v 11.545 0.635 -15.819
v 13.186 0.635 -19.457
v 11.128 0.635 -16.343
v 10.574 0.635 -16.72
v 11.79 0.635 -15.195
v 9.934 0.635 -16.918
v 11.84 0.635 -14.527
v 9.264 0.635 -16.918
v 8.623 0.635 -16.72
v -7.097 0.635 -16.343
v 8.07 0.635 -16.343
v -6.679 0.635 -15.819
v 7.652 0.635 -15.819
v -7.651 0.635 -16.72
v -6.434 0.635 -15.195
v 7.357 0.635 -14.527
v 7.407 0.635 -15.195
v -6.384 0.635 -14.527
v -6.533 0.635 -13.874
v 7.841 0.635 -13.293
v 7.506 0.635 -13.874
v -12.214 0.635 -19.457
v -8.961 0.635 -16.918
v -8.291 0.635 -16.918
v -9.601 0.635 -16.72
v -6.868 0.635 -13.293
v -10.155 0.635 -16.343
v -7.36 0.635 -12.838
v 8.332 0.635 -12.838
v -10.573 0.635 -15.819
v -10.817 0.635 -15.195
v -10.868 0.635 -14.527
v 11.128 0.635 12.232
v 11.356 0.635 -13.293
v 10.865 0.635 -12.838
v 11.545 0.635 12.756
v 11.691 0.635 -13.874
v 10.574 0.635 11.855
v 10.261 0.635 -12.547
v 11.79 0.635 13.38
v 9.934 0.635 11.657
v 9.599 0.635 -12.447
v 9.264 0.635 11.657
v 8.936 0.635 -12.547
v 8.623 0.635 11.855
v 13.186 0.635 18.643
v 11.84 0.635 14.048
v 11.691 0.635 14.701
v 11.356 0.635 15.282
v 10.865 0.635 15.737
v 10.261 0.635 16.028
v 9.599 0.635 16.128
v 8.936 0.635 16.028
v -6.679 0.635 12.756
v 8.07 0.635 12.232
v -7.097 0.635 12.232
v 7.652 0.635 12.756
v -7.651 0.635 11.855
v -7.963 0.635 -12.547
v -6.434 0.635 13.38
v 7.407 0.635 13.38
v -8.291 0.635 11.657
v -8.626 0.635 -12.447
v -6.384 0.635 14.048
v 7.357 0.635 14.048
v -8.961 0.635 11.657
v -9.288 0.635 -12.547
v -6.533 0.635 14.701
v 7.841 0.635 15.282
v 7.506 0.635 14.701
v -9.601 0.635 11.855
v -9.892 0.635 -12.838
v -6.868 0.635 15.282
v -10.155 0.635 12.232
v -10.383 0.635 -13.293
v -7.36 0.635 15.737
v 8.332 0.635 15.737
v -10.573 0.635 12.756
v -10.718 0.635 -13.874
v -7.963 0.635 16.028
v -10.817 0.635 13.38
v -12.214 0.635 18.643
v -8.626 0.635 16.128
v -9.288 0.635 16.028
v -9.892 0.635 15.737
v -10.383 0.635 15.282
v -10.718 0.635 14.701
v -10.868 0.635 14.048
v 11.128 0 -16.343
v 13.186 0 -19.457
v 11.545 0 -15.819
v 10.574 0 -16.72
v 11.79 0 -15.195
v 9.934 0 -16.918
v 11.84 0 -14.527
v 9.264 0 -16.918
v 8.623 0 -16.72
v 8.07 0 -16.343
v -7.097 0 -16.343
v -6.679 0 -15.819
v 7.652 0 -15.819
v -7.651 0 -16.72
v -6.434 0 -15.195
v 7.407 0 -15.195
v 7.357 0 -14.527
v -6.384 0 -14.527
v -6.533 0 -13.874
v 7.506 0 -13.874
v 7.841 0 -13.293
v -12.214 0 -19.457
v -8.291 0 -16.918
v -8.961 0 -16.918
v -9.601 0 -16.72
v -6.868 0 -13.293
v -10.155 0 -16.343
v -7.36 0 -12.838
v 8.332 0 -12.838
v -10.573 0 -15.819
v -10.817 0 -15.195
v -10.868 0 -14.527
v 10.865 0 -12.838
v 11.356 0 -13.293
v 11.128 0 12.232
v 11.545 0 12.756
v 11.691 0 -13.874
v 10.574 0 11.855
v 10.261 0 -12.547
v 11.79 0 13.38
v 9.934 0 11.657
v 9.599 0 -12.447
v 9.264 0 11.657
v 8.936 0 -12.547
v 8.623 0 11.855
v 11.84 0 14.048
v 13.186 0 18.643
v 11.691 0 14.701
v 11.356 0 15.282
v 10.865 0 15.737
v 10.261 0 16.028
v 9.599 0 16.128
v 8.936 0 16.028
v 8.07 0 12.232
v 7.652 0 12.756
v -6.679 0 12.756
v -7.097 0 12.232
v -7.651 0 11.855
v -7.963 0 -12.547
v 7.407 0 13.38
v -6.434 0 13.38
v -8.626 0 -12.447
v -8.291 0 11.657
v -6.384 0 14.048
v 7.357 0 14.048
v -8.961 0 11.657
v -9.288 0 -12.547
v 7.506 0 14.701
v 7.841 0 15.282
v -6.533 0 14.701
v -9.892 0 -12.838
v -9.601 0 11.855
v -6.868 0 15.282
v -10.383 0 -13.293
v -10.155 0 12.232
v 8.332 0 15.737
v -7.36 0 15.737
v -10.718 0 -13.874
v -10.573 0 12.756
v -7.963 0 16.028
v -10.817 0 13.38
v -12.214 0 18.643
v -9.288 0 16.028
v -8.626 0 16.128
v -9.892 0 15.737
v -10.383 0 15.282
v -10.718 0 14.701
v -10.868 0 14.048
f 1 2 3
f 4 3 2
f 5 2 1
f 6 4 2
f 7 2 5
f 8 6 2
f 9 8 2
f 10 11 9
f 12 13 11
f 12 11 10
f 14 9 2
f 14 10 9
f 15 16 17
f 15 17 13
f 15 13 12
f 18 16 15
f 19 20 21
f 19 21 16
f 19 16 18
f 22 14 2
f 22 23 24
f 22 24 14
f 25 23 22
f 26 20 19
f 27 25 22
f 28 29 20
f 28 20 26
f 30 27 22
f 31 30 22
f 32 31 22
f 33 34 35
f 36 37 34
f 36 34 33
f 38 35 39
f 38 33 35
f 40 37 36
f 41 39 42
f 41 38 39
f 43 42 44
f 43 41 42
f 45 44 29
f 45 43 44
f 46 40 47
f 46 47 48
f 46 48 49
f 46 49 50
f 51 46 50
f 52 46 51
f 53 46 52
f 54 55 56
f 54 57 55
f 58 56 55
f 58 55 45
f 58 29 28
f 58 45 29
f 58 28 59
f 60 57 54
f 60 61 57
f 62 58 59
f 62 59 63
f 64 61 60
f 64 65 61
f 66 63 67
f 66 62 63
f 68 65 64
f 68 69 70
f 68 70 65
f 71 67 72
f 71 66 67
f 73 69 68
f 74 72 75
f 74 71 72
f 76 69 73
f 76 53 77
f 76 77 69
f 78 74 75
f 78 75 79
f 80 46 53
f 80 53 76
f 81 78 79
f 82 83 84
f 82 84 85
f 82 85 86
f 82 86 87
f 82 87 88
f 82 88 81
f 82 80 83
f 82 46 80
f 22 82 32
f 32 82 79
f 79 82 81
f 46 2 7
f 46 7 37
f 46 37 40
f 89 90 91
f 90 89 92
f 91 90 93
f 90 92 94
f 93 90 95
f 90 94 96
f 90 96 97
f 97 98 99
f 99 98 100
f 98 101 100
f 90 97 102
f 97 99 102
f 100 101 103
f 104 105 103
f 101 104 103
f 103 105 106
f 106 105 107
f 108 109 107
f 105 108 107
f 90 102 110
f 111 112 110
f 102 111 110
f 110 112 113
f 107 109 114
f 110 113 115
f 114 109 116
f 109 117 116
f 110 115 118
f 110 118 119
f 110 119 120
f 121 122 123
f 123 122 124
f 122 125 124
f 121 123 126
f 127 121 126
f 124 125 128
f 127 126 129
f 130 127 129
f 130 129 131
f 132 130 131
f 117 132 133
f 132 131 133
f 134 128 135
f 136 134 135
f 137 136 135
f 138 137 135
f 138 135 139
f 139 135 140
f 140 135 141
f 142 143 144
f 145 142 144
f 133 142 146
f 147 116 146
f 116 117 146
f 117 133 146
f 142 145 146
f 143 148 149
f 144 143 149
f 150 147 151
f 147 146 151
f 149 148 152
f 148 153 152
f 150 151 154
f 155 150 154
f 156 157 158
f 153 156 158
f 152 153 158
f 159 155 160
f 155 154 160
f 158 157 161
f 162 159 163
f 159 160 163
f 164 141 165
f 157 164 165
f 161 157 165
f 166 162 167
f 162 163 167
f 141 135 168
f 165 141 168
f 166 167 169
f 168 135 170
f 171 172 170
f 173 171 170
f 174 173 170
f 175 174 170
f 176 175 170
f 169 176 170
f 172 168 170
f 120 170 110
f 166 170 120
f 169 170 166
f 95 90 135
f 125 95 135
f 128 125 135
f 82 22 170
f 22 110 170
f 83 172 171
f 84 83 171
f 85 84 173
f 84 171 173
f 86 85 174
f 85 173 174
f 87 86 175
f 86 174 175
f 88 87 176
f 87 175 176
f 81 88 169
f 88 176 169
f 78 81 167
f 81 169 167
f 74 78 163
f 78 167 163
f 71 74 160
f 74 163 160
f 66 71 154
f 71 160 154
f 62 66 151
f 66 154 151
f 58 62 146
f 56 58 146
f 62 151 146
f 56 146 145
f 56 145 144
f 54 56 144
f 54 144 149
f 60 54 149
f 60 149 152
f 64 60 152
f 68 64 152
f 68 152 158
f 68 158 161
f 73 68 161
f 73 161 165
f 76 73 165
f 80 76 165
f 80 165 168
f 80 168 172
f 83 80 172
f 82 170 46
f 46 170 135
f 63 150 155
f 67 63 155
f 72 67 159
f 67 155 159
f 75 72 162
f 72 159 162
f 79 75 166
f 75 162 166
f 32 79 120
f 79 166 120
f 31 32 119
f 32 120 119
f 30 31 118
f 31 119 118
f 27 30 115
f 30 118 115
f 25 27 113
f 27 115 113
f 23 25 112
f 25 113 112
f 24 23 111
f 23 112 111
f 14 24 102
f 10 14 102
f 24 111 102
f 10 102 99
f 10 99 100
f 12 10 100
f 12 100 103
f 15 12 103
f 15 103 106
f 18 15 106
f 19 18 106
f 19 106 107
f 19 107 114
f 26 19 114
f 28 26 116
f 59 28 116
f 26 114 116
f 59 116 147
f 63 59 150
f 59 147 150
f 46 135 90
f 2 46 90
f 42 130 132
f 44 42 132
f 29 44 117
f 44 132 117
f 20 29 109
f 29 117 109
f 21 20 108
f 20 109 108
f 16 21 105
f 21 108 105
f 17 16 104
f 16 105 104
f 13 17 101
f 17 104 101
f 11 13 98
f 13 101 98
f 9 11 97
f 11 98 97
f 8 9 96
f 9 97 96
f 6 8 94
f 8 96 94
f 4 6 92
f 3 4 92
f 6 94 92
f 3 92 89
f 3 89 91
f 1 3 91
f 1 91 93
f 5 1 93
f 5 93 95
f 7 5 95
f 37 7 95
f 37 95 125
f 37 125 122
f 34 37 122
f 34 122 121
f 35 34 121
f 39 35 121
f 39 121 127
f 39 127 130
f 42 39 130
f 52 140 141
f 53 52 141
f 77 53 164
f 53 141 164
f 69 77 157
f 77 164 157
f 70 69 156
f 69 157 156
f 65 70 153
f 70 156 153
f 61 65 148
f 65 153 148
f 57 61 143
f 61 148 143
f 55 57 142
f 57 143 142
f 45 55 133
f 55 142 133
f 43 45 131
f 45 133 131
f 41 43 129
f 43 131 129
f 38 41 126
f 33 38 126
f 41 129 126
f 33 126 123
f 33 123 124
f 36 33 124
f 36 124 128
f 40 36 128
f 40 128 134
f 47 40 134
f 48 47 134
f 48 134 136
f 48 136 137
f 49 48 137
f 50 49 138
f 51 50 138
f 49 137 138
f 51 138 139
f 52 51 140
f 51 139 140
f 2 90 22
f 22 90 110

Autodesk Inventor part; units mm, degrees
ref_plane "YZ Plane" through (0, 0, 0) normal (1, 0, 0) x (0, 1, 0)
ref_plane "XZ Plane" through (0, 0, 0) normal (0, 1, 0) x (-1, 0, 0)
ref_plane "XY Plane" through (0, 0, 0) normal (0, 0, 1) x (1, 0, 0)
sketch "Sketch1" plane through (0, 0, 0) normal (0, 1, 0) x (-1, 0, 0)
  line L0 (12.2137, 18.6426) -> (-13.1863, 18.6426)
  line L1 (-13.1863, 18.6426) -> (-13.1863, -19.4574)
  line L2 (-13.1863, -19.4574) -> (12.2137, -19.4574)
  line L3 (12.2137, -19.4574) -> (12.2137, 18.6426)
  point P0 (0, 0)
  dimension "d0" = 25.4
  dimension "d1" = 38.1
extrude "Extrusion1" add sketch "Sketch1" along normal blind 0.635
hole "Hole1" at (9.5986, 0.635, 13.8801) direction (0, -1, 0) diameter 4.4958 depth 0.635 clearance for "Flat Head Machine Screw (82)" size "#8" standard "Ansi Unified Screw Threads"
hole "Hole2" at (-8.6259, 0.635, 13.8801) direction (0, -1, 0) diameter 4.4958 depth 0.635 clearance for "Flat Head Machine Screw (82)" size "#8" standard "Ansi Unified Screw Threads"
hole "Hole3" at (-8.6259, 0.635, -14.6949) direction (0, -1, 0) diameter 4.4958 depth 0.635 clearance for "Flat Head Machine Screw (82)" size "#8" standard "Ansi Unified Screw Threads"
hole "Hole4" at (9.5986, 0.635, -14.6949) direction (0, -1, 0) diameter 4.4958 depth 0.635 clearance for "Flat Head Machine Screw (82)" size "#8" standard "Ansi Unified Screw Threads"
properties part number "Shielding"
